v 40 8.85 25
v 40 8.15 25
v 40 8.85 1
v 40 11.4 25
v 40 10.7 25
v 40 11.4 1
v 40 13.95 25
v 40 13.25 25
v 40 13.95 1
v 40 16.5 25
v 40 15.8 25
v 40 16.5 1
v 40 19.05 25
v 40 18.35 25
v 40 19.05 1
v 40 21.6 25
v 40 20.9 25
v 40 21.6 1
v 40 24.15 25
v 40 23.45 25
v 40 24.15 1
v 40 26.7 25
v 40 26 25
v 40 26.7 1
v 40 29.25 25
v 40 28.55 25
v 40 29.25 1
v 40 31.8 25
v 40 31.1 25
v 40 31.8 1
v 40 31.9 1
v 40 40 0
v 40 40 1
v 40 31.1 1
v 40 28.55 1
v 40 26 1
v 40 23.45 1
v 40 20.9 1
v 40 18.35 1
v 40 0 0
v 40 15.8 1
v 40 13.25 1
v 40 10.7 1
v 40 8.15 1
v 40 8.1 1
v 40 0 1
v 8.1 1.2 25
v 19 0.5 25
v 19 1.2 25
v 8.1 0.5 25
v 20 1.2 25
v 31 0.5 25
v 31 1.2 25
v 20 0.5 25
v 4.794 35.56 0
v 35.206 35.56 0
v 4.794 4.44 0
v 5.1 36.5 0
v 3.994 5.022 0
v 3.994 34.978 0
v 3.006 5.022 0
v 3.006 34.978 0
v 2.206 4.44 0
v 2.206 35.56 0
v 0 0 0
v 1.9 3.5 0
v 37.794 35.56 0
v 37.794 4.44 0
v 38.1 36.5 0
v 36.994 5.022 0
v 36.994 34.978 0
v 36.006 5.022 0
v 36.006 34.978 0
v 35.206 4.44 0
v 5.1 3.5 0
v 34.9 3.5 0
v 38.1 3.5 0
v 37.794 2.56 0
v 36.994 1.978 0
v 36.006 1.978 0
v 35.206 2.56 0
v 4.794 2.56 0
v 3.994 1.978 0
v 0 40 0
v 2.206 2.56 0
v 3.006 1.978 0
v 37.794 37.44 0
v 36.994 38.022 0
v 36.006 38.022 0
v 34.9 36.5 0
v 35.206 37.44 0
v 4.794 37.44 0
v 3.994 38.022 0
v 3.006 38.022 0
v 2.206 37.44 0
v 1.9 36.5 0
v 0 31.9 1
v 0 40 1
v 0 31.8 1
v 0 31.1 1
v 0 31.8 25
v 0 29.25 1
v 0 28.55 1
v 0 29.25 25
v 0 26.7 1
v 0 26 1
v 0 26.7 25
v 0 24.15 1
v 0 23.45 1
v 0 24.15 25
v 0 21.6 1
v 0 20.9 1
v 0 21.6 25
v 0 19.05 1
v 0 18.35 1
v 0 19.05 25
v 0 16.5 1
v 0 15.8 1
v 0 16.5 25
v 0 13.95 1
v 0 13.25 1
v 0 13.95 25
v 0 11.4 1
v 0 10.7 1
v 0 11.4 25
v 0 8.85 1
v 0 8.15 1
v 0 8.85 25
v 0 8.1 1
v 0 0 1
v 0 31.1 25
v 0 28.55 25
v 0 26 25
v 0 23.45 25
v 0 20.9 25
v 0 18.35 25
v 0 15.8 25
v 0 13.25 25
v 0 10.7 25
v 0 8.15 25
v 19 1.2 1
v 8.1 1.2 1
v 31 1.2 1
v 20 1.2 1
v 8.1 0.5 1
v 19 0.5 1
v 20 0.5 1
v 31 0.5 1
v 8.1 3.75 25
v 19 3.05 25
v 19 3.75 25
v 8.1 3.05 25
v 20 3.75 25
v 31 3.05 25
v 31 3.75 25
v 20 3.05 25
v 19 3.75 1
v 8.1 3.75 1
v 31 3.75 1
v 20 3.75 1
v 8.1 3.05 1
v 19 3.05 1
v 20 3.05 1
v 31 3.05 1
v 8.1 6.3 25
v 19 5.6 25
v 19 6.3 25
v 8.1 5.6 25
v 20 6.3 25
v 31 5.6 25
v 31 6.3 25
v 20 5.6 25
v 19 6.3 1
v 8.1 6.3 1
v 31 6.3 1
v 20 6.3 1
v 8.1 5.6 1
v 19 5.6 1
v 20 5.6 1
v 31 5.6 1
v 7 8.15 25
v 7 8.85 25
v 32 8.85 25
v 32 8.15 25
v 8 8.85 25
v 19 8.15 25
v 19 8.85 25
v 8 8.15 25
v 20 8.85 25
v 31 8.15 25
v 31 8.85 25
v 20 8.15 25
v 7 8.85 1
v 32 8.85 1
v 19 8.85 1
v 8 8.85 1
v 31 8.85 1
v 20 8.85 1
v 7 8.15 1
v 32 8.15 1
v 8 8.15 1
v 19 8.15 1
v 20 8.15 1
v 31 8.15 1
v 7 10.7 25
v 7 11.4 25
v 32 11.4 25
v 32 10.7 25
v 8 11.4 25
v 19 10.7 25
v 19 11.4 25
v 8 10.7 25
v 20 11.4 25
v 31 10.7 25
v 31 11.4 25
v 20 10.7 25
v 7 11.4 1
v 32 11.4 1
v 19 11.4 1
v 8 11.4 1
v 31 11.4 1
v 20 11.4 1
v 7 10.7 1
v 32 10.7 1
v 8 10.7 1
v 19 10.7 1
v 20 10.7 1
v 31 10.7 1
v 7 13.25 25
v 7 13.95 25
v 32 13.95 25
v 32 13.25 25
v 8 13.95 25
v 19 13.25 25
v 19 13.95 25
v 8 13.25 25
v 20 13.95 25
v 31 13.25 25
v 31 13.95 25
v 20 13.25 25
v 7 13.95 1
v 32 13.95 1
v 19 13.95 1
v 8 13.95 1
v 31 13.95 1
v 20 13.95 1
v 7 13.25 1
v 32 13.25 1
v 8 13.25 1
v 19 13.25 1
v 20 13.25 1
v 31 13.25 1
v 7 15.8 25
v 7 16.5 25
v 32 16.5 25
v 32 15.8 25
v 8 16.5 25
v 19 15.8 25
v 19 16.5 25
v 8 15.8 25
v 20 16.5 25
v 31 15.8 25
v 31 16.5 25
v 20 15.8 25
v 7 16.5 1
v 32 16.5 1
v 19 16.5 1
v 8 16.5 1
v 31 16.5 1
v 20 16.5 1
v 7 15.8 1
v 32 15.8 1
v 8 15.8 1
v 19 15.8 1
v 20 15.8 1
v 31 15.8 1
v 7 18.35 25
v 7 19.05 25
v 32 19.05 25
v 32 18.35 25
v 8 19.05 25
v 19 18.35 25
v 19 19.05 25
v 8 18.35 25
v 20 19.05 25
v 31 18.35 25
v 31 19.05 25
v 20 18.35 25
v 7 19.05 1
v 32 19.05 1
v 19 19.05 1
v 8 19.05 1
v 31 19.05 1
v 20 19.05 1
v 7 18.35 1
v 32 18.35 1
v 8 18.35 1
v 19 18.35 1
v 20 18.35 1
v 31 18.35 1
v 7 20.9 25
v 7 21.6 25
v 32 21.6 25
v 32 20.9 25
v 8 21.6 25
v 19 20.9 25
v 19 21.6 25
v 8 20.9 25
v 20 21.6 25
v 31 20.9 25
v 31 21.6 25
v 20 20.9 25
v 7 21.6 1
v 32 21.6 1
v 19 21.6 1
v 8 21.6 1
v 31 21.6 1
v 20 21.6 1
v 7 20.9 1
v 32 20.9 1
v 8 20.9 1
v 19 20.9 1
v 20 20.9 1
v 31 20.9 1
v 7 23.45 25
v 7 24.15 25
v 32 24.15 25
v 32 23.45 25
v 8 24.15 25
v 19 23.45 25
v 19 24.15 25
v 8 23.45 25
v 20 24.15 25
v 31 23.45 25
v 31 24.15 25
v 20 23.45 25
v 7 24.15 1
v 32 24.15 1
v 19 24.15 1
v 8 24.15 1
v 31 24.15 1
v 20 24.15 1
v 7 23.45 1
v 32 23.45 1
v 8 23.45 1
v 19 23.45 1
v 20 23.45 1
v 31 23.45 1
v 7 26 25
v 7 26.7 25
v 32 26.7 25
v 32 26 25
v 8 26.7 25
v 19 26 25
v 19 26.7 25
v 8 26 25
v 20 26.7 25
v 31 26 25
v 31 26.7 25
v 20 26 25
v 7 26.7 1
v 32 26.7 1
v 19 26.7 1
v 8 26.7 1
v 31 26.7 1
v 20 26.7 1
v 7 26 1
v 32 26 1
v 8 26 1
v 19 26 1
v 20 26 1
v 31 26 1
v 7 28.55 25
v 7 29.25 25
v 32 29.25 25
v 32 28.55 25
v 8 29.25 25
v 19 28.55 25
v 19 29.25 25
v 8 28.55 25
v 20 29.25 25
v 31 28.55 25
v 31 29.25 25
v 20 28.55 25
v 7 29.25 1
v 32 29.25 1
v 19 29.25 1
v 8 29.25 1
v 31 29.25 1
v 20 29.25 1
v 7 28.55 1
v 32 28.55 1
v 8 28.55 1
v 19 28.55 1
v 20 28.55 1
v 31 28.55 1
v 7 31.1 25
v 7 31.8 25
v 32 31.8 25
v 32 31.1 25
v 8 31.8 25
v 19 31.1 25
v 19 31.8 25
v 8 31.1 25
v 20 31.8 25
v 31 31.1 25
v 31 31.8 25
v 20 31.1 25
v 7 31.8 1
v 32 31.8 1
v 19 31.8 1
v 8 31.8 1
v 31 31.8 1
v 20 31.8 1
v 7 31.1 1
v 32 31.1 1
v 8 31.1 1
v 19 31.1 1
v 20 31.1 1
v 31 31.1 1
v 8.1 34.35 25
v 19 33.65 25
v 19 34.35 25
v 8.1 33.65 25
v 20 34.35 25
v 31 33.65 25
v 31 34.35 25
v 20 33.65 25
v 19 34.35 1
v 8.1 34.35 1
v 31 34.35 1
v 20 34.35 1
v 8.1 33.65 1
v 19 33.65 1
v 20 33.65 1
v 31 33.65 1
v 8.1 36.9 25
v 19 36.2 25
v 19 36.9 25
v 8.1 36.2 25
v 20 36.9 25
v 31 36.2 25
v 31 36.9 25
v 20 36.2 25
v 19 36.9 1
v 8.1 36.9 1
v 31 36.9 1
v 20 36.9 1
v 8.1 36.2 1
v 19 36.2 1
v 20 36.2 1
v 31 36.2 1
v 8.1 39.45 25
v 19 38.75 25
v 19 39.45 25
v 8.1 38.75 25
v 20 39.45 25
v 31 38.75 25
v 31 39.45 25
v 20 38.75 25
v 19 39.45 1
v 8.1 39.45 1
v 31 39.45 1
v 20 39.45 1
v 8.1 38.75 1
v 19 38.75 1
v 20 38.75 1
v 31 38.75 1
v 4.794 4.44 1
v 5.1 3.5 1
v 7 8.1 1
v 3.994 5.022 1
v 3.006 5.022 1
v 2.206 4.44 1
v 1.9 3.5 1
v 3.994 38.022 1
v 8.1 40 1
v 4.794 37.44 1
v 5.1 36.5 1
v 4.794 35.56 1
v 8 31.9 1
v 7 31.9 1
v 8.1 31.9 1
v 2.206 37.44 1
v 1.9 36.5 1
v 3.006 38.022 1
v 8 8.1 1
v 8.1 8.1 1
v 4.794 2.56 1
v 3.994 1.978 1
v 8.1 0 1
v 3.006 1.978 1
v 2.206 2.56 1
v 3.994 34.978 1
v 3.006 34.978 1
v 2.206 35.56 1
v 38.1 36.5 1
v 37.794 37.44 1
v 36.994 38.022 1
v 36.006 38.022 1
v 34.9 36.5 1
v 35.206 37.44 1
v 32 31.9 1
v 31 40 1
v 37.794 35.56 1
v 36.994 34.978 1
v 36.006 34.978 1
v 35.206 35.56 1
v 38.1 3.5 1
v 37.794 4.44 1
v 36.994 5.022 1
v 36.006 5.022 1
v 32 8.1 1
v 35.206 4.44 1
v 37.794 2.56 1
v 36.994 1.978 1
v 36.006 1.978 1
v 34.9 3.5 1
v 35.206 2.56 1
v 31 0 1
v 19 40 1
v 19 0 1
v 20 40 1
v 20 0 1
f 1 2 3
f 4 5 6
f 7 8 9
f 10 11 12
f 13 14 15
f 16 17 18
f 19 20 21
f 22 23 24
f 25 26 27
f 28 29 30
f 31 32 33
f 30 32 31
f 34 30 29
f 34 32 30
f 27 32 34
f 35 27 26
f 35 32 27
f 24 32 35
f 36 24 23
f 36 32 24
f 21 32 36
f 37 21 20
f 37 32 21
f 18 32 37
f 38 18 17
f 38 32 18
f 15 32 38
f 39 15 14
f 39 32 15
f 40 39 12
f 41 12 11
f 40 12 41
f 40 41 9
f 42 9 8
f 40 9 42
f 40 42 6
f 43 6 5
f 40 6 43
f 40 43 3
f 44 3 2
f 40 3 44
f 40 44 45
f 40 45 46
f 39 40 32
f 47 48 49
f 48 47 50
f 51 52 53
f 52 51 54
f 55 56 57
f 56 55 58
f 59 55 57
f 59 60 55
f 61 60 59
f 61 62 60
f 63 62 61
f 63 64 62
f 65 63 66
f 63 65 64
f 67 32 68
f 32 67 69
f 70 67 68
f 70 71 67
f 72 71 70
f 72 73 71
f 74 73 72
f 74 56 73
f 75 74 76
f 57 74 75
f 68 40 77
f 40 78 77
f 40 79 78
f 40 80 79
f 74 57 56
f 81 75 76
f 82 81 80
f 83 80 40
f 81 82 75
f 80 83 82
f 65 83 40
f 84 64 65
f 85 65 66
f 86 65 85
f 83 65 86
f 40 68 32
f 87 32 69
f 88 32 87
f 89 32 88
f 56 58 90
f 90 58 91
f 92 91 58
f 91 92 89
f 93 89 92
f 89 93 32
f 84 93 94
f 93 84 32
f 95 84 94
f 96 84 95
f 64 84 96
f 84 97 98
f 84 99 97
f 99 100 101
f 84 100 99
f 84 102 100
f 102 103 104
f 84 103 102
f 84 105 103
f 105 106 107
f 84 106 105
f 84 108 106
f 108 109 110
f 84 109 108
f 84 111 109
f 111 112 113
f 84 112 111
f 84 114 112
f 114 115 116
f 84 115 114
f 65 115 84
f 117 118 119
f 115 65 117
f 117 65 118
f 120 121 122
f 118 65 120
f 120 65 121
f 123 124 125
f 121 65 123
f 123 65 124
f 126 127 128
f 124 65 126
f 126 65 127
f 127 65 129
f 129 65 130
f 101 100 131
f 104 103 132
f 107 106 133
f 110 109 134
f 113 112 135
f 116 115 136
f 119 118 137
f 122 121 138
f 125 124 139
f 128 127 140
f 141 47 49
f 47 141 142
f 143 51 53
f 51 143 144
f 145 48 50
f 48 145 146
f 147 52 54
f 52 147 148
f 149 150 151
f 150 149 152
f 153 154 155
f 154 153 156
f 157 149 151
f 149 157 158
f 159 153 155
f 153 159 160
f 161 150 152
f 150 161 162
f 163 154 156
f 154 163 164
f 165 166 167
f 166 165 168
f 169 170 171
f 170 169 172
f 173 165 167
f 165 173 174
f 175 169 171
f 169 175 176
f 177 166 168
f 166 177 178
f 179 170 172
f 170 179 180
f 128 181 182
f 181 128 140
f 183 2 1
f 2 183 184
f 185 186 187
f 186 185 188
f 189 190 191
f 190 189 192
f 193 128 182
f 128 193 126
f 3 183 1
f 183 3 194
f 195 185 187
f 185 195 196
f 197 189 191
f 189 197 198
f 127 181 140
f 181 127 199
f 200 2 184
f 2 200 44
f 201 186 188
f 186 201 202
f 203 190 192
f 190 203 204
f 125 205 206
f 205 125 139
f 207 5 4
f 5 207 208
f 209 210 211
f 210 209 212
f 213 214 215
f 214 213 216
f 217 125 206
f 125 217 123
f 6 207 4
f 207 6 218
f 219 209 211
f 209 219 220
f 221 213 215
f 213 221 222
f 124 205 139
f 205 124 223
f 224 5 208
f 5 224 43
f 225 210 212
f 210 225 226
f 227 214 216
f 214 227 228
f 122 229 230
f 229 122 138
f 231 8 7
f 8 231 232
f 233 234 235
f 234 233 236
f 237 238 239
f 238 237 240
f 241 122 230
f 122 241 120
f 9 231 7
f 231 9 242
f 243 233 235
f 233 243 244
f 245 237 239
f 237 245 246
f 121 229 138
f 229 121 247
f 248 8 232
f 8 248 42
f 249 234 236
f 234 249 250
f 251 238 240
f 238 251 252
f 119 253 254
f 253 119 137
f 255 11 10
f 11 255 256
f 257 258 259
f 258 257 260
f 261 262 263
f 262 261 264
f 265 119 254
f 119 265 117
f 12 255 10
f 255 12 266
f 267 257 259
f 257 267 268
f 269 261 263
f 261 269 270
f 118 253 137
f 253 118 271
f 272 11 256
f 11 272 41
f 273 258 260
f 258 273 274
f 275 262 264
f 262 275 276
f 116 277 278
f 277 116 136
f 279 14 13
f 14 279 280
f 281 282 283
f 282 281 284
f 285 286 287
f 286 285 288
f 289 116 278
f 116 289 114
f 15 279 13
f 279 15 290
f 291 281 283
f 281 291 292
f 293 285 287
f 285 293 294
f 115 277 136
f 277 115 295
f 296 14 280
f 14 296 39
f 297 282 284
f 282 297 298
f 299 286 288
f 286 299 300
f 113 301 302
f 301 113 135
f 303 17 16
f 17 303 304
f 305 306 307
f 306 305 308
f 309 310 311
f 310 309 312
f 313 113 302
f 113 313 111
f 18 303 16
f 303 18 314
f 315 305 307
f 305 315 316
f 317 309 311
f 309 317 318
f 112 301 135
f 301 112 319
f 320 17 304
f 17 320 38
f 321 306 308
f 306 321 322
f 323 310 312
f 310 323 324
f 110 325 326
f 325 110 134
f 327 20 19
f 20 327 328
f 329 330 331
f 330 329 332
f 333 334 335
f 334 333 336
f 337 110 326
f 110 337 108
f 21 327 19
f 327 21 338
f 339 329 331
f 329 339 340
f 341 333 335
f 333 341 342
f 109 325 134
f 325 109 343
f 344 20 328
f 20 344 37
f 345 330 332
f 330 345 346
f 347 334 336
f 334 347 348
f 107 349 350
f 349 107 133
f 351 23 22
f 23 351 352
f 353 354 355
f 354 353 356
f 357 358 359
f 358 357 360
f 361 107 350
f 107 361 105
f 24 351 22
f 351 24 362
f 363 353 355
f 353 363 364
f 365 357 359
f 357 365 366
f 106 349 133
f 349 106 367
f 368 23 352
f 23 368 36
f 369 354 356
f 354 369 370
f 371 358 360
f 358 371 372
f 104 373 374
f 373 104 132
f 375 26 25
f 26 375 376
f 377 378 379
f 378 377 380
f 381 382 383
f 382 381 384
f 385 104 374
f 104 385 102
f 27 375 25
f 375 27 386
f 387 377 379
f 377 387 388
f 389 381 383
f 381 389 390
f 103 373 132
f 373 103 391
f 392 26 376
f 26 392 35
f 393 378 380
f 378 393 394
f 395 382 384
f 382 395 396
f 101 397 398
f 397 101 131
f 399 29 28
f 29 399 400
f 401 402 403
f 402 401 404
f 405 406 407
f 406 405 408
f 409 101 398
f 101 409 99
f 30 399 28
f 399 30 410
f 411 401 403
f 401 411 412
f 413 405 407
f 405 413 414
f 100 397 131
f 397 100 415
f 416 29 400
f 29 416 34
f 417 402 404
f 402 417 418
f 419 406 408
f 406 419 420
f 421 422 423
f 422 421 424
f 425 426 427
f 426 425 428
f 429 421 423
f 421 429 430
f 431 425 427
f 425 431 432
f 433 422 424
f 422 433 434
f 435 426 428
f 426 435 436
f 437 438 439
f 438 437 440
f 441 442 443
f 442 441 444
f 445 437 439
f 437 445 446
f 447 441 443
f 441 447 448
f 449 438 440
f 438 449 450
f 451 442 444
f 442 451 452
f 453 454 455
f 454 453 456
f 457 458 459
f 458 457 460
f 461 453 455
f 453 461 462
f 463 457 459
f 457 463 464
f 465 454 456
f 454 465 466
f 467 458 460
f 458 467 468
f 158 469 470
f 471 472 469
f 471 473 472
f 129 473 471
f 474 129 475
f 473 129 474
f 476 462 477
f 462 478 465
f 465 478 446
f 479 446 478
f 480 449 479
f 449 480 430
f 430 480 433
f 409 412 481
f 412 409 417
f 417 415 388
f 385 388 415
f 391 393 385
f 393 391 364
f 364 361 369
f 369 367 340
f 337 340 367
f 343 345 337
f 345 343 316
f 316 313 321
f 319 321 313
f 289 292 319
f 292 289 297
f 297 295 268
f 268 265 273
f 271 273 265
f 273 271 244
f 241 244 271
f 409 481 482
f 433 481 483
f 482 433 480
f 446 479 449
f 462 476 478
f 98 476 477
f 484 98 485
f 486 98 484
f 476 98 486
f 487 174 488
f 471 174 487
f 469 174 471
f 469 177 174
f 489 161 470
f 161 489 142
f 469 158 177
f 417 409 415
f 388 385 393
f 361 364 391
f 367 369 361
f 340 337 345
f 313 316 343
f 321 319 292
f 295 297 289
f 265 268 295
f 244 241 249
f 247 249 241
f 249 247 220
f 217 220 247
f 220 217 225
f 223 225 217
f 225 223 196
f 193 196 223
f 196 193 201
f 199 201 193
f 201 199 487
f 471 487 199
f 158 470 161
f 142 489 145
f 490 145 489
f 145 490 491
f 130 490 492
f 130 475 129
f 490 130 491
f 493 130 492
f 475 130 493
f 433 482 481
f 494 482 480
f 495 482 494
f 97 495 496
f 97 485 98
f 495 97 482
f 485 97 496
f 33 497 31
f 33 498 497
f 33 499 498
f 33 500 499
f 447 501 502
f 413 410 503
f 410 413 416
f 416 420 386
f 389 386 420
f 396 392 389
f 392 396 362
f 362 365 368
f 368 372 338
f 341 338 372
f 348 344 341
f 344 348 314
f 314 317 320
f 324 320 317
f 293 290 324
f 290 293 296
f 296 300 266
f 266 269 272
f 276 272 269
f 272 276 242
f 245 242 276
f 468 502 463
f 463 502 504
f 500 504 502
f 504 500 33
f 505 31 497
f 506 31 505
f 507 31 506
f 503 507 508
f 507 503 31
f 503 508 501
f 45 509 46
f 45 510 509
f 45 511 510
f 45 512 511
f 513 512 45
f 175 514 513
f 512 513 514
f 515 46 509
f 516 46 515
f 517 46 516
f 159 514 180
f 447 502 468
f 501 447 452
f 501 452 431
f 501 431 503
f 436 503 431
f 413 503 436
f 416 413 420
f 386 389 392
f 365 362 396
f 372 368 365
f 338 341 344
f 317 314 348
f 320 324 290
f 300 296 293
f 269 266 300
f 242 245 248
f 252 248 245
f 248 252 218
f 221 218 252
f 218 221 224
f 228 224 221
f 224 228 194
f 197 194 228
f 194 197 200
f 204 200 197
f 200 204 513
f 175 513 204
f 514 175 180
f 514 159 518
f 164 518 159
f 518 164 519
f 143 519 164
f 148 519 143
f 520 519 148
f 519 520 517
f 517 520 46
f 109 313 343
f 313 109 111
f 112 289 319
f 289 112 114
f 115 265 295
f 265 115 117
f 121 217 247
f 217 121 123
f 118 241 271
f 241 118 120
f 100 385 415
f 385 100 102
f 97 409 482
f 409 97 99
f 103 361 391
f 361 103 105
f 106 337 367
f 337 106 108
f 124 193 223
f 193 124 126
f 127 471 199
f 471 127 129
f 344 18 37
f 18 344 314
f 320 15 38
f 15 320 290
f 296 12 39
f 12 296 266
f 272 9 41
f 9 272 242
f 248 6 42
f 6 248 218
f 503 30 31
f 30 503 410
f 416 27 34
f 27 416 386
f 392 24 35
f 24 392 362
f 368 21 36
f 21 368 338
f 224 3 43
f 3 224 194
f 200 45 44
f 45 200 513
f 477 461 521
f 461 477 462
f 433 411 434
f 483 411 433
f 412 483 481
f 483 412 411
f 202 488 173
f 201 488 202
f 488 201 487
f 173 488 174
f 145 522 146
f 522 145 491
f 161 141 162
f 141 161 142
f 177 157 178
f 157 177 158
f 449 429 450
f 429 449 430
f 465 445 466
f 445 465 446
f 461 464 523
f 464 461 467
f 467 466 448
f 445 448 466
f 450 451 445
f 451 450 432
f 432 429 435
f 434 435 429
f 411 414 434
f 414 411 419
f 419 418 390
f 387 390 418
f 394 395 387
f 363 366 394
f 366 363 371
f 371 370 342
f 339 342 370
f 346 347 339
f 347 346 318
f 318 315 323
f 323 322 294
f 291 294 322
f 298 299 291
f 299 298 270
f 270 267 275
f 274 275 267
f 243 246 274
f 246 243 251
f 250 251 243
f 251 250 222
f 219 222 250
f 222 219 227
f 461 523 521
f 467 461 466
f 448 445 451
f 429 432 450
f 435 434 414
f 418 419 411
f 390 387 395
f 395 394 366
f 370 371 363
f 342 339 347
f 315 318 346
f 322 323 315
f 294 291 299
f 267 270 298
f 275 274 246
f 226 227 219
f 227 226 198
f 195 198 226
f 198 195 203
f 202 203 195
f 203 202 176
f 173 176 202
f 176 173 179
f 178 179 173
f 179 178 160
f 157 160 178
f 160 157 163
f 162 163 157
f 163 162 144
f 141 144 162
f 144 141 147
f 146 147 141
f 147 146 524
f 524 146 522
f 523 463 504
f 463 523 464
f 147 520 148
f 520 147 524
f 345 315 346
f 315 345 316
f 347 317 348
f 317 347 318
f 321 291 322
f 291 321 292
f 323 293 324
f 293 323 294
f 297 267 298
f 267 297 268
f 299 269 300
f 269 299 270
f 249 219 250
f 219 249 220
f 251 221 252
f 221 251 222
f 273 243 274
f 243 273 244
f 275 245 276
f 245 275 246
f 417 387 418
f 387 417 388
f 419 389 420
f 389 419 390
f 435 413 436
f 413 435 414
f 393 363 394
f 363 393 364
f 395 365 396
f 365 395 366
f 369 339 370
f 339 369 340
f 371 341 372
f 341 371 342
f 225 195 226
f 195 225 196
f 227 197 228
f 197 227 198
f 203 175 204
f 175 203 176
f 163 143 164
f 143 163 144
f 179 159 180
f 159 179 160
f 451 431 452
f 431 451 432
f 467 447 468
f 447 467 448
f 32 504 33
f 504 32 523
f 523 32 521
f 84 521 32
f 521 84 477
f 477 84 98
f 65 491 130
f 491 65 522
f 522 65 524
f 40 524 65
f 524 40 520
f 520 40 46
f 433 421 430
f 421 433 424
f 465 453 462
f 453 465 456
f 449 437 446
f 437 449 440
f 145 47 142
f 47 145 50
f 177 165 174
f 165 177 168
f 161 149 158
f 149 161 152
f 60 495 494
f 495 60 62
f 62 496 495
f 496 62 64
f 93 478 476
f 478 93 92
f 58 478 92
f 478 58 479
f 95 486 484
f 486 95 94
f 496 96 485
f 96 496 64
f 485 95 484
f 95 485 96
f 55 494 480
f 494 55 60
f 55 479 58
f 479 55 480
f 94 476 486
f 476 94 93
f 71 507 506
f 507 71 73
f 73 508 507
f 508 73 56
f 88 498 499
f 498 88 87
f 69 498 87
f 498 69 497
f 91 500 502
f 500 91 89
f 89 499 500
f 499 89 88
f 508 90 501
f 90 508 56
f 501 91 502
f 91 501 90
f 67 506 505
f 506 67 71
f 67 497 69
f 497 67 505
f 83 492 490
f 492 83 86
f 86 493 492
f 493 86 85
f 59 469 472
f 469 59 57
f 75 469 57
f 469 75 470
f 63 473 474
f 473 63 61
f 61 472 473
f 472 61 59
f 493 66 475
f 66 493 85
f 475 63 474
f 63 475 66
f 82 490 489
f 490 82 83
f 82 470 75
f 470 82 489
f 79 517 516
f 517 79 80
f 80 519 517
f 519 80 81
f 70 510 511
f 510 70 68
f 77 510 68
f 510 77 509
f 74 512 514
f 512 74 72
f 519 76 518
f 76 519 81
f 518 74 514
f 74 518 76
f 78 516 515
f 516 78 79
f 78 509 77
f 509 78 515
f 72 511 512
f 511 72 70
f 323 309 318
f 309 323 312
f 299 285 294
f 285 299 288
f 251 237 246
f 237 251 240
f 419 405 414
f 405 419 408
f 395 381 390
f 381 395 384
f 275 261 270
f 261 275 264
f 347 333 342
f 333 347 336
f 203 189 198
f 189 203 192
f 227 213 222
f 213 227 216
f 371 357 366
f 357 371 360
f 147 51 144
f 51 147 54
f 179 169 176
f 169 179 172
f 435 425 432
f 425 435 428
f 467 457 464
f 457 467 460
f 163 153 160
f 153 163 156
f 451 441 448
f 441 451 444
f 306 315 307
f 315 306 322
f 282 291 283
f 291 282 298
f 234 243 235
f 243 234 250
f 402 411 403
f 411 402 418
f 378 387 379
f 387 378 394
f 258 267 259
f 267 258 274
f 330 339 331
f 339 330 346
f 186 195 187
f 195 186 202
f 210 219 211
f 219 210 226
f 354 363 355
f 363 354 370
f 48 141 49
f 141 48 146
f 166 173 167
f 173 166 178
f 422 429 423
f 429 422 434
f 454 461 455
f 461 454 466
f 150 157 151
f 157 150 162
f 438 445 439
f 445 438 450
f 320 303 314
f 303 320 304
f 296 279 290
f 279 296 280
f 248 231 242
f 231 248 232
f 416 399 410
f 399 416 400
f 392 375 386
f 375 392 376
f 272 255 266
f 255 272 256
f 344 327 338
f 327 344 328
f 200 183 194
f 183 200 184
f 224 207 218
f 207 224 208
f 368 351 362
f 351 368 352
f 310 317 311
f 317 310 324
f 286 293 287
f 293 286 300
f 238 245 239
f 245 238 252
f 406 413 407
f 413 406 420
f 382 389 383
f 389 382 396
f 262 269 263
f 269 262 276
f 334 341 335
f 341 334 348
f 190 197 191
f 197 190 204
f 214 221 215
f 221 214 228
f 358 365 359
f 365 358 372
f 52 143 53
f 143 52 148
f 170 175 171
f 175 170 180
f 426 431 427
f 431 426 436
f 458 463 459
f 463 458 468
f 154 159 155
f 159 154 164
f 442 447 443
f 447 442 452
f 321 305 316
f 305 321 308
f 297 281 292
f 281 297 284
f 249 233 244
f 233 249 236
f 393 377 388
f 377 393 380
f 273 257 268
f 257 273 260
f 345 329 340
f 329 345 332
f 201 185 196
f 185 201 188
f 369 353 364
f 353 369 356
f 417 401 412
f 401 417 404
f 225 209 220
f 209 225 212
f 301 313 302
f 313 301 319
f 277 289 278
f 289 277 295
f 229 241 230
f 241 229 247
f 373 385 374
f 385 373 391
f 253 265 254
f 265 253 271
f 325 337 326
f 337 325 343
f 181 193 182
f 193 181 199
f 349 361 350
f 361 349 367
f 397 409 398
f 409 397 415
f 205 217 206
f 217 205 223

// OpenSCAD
$fn=10;
a=8.1;
h=3.5;
color("#31aee1") difference() {
    union() {
        cube([40, 40, 1]);

        for (i=[0: 15]) {
            translate([0, 0.5+i*2.55, 0]) cube([40, 0.7, 25]);
        }
    }
    for (i=[0:3]) {
        tx = (i % 2) == 0 ? 0 : (40-a);
        ty = floor(i / 2) != 0 ? 0 : (40-a);
        translate([tx, ty, 1]) cube([a, a, 25]);
    }
    for (i=[0:3]) {
        tx = (i % 2) == 0 ? h : (40-h);
        ty = floor(i / 2) != 0 ? h : (40-h);
        translate([tx, ty, -1]) cylinder(d=3.2, h=10);
    }
    translate([20-1, 0, 1]) cube([1, 40, 25]);
    translate([20-1+12, 0, 1]) cube([1, 40, 25]);
    translate([20-1-12, 0, 1]) cube([1, 40, 25]);
}
